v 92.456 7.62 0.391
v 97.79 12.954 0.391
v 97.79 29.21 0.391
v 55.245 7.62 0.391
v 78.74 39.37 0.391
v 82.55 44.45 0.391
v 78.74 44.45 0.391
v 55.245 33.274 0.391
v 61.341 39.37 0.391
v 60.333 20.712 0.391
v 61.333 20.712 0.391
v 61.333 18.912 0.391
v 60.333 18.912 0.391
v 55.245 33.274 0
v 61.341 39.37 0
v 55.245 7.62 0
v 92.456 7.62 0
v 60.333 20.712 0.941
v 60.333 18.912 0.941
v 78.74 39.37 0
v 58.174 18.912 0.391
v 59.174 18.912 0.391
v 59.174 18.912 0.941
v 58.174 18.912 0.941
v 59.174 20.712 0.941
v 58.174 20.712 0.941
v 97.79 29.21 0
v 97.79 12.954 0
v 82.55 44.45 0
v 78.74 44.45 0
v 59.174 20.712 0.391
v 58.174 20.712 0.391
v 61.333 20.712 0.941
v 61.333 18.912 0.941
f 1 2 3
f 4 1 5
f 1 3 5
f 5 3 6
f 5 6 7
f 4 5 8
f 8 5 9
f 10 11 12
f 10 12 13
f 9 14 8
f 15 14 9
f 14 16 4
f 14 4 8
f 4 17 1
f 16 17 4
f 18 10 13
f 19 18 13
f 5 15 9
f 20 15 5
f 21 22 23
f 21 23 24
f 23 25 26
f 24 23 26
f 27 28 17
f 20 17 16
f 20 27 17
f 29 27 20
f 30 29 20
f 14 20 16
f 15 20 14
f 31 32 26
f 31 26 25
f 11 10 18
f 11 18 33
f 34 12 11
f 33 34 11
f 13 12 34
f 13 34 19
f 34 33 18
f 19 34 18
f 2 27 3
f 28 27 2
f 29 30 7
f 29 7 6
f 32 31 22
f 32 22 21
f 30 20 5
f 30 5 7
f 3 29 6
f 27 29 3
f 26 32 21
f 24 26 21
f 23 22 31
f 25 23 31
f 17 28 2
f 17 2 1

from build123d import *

# Parameters (mm, degrees)
BOARD_DEPTH                   = 0.3912
RESC1608X55X30ML20T10_1_DEPTH = 0.55
RESC1608X55X30ML20T10_2_DEPTH = 0.55


with BuildPart() as part:
    # Эскиз1 → BOARD (new body)
    with BuildSketch(Plane.XY):
        Polygon((55.245, 7.62), (55.245, 33.274), (61.341, 39.37), (78.74, 39.37), (78.74, 44.45), (82.55, 44.45), (97.79, 29.21), (97.79, 12.954), (92.456, 7.62), align=None)
    extrude(amount=BOARD_DEPTH)


with BuildPart() as body_2:
    # Эскиз2 → RESC1608X55X30ML20T10-1 (new body)
    with BuildSketch(Plane.XY.offset(0.3912)):
        Polygon((61.333, 20.412), (61.333, 19.212), (61.333, 18.912), (60.333, 18.912), (60.333, 19.212), (60.333, 20.412), (60.333, 20.712), (61.333, 20.712), align=None)
    extrude(amount=RESC1608X55X30ML20T10_1_DEPTH)


with BuildPart() as body_3:
    # Эскиз3 → RESC1608X55X30ML20T10-2 (new body)
    with BuildSketch(Plane.XY.offset(0.3912)):
        Polygon((59.174, 20.412), (59.174, 19.212), (59.174, 18.912), (58.174, 18.912), (58.174, 19.212), (58.174, 20.412), (58.174, 20.712), (59.174, 20.712), align=None)
    extrude(amount=RESC1608X55X30ML20T10_2_DEPTH)


solid = Compound([part.part, body_2.part, body_3.part])
